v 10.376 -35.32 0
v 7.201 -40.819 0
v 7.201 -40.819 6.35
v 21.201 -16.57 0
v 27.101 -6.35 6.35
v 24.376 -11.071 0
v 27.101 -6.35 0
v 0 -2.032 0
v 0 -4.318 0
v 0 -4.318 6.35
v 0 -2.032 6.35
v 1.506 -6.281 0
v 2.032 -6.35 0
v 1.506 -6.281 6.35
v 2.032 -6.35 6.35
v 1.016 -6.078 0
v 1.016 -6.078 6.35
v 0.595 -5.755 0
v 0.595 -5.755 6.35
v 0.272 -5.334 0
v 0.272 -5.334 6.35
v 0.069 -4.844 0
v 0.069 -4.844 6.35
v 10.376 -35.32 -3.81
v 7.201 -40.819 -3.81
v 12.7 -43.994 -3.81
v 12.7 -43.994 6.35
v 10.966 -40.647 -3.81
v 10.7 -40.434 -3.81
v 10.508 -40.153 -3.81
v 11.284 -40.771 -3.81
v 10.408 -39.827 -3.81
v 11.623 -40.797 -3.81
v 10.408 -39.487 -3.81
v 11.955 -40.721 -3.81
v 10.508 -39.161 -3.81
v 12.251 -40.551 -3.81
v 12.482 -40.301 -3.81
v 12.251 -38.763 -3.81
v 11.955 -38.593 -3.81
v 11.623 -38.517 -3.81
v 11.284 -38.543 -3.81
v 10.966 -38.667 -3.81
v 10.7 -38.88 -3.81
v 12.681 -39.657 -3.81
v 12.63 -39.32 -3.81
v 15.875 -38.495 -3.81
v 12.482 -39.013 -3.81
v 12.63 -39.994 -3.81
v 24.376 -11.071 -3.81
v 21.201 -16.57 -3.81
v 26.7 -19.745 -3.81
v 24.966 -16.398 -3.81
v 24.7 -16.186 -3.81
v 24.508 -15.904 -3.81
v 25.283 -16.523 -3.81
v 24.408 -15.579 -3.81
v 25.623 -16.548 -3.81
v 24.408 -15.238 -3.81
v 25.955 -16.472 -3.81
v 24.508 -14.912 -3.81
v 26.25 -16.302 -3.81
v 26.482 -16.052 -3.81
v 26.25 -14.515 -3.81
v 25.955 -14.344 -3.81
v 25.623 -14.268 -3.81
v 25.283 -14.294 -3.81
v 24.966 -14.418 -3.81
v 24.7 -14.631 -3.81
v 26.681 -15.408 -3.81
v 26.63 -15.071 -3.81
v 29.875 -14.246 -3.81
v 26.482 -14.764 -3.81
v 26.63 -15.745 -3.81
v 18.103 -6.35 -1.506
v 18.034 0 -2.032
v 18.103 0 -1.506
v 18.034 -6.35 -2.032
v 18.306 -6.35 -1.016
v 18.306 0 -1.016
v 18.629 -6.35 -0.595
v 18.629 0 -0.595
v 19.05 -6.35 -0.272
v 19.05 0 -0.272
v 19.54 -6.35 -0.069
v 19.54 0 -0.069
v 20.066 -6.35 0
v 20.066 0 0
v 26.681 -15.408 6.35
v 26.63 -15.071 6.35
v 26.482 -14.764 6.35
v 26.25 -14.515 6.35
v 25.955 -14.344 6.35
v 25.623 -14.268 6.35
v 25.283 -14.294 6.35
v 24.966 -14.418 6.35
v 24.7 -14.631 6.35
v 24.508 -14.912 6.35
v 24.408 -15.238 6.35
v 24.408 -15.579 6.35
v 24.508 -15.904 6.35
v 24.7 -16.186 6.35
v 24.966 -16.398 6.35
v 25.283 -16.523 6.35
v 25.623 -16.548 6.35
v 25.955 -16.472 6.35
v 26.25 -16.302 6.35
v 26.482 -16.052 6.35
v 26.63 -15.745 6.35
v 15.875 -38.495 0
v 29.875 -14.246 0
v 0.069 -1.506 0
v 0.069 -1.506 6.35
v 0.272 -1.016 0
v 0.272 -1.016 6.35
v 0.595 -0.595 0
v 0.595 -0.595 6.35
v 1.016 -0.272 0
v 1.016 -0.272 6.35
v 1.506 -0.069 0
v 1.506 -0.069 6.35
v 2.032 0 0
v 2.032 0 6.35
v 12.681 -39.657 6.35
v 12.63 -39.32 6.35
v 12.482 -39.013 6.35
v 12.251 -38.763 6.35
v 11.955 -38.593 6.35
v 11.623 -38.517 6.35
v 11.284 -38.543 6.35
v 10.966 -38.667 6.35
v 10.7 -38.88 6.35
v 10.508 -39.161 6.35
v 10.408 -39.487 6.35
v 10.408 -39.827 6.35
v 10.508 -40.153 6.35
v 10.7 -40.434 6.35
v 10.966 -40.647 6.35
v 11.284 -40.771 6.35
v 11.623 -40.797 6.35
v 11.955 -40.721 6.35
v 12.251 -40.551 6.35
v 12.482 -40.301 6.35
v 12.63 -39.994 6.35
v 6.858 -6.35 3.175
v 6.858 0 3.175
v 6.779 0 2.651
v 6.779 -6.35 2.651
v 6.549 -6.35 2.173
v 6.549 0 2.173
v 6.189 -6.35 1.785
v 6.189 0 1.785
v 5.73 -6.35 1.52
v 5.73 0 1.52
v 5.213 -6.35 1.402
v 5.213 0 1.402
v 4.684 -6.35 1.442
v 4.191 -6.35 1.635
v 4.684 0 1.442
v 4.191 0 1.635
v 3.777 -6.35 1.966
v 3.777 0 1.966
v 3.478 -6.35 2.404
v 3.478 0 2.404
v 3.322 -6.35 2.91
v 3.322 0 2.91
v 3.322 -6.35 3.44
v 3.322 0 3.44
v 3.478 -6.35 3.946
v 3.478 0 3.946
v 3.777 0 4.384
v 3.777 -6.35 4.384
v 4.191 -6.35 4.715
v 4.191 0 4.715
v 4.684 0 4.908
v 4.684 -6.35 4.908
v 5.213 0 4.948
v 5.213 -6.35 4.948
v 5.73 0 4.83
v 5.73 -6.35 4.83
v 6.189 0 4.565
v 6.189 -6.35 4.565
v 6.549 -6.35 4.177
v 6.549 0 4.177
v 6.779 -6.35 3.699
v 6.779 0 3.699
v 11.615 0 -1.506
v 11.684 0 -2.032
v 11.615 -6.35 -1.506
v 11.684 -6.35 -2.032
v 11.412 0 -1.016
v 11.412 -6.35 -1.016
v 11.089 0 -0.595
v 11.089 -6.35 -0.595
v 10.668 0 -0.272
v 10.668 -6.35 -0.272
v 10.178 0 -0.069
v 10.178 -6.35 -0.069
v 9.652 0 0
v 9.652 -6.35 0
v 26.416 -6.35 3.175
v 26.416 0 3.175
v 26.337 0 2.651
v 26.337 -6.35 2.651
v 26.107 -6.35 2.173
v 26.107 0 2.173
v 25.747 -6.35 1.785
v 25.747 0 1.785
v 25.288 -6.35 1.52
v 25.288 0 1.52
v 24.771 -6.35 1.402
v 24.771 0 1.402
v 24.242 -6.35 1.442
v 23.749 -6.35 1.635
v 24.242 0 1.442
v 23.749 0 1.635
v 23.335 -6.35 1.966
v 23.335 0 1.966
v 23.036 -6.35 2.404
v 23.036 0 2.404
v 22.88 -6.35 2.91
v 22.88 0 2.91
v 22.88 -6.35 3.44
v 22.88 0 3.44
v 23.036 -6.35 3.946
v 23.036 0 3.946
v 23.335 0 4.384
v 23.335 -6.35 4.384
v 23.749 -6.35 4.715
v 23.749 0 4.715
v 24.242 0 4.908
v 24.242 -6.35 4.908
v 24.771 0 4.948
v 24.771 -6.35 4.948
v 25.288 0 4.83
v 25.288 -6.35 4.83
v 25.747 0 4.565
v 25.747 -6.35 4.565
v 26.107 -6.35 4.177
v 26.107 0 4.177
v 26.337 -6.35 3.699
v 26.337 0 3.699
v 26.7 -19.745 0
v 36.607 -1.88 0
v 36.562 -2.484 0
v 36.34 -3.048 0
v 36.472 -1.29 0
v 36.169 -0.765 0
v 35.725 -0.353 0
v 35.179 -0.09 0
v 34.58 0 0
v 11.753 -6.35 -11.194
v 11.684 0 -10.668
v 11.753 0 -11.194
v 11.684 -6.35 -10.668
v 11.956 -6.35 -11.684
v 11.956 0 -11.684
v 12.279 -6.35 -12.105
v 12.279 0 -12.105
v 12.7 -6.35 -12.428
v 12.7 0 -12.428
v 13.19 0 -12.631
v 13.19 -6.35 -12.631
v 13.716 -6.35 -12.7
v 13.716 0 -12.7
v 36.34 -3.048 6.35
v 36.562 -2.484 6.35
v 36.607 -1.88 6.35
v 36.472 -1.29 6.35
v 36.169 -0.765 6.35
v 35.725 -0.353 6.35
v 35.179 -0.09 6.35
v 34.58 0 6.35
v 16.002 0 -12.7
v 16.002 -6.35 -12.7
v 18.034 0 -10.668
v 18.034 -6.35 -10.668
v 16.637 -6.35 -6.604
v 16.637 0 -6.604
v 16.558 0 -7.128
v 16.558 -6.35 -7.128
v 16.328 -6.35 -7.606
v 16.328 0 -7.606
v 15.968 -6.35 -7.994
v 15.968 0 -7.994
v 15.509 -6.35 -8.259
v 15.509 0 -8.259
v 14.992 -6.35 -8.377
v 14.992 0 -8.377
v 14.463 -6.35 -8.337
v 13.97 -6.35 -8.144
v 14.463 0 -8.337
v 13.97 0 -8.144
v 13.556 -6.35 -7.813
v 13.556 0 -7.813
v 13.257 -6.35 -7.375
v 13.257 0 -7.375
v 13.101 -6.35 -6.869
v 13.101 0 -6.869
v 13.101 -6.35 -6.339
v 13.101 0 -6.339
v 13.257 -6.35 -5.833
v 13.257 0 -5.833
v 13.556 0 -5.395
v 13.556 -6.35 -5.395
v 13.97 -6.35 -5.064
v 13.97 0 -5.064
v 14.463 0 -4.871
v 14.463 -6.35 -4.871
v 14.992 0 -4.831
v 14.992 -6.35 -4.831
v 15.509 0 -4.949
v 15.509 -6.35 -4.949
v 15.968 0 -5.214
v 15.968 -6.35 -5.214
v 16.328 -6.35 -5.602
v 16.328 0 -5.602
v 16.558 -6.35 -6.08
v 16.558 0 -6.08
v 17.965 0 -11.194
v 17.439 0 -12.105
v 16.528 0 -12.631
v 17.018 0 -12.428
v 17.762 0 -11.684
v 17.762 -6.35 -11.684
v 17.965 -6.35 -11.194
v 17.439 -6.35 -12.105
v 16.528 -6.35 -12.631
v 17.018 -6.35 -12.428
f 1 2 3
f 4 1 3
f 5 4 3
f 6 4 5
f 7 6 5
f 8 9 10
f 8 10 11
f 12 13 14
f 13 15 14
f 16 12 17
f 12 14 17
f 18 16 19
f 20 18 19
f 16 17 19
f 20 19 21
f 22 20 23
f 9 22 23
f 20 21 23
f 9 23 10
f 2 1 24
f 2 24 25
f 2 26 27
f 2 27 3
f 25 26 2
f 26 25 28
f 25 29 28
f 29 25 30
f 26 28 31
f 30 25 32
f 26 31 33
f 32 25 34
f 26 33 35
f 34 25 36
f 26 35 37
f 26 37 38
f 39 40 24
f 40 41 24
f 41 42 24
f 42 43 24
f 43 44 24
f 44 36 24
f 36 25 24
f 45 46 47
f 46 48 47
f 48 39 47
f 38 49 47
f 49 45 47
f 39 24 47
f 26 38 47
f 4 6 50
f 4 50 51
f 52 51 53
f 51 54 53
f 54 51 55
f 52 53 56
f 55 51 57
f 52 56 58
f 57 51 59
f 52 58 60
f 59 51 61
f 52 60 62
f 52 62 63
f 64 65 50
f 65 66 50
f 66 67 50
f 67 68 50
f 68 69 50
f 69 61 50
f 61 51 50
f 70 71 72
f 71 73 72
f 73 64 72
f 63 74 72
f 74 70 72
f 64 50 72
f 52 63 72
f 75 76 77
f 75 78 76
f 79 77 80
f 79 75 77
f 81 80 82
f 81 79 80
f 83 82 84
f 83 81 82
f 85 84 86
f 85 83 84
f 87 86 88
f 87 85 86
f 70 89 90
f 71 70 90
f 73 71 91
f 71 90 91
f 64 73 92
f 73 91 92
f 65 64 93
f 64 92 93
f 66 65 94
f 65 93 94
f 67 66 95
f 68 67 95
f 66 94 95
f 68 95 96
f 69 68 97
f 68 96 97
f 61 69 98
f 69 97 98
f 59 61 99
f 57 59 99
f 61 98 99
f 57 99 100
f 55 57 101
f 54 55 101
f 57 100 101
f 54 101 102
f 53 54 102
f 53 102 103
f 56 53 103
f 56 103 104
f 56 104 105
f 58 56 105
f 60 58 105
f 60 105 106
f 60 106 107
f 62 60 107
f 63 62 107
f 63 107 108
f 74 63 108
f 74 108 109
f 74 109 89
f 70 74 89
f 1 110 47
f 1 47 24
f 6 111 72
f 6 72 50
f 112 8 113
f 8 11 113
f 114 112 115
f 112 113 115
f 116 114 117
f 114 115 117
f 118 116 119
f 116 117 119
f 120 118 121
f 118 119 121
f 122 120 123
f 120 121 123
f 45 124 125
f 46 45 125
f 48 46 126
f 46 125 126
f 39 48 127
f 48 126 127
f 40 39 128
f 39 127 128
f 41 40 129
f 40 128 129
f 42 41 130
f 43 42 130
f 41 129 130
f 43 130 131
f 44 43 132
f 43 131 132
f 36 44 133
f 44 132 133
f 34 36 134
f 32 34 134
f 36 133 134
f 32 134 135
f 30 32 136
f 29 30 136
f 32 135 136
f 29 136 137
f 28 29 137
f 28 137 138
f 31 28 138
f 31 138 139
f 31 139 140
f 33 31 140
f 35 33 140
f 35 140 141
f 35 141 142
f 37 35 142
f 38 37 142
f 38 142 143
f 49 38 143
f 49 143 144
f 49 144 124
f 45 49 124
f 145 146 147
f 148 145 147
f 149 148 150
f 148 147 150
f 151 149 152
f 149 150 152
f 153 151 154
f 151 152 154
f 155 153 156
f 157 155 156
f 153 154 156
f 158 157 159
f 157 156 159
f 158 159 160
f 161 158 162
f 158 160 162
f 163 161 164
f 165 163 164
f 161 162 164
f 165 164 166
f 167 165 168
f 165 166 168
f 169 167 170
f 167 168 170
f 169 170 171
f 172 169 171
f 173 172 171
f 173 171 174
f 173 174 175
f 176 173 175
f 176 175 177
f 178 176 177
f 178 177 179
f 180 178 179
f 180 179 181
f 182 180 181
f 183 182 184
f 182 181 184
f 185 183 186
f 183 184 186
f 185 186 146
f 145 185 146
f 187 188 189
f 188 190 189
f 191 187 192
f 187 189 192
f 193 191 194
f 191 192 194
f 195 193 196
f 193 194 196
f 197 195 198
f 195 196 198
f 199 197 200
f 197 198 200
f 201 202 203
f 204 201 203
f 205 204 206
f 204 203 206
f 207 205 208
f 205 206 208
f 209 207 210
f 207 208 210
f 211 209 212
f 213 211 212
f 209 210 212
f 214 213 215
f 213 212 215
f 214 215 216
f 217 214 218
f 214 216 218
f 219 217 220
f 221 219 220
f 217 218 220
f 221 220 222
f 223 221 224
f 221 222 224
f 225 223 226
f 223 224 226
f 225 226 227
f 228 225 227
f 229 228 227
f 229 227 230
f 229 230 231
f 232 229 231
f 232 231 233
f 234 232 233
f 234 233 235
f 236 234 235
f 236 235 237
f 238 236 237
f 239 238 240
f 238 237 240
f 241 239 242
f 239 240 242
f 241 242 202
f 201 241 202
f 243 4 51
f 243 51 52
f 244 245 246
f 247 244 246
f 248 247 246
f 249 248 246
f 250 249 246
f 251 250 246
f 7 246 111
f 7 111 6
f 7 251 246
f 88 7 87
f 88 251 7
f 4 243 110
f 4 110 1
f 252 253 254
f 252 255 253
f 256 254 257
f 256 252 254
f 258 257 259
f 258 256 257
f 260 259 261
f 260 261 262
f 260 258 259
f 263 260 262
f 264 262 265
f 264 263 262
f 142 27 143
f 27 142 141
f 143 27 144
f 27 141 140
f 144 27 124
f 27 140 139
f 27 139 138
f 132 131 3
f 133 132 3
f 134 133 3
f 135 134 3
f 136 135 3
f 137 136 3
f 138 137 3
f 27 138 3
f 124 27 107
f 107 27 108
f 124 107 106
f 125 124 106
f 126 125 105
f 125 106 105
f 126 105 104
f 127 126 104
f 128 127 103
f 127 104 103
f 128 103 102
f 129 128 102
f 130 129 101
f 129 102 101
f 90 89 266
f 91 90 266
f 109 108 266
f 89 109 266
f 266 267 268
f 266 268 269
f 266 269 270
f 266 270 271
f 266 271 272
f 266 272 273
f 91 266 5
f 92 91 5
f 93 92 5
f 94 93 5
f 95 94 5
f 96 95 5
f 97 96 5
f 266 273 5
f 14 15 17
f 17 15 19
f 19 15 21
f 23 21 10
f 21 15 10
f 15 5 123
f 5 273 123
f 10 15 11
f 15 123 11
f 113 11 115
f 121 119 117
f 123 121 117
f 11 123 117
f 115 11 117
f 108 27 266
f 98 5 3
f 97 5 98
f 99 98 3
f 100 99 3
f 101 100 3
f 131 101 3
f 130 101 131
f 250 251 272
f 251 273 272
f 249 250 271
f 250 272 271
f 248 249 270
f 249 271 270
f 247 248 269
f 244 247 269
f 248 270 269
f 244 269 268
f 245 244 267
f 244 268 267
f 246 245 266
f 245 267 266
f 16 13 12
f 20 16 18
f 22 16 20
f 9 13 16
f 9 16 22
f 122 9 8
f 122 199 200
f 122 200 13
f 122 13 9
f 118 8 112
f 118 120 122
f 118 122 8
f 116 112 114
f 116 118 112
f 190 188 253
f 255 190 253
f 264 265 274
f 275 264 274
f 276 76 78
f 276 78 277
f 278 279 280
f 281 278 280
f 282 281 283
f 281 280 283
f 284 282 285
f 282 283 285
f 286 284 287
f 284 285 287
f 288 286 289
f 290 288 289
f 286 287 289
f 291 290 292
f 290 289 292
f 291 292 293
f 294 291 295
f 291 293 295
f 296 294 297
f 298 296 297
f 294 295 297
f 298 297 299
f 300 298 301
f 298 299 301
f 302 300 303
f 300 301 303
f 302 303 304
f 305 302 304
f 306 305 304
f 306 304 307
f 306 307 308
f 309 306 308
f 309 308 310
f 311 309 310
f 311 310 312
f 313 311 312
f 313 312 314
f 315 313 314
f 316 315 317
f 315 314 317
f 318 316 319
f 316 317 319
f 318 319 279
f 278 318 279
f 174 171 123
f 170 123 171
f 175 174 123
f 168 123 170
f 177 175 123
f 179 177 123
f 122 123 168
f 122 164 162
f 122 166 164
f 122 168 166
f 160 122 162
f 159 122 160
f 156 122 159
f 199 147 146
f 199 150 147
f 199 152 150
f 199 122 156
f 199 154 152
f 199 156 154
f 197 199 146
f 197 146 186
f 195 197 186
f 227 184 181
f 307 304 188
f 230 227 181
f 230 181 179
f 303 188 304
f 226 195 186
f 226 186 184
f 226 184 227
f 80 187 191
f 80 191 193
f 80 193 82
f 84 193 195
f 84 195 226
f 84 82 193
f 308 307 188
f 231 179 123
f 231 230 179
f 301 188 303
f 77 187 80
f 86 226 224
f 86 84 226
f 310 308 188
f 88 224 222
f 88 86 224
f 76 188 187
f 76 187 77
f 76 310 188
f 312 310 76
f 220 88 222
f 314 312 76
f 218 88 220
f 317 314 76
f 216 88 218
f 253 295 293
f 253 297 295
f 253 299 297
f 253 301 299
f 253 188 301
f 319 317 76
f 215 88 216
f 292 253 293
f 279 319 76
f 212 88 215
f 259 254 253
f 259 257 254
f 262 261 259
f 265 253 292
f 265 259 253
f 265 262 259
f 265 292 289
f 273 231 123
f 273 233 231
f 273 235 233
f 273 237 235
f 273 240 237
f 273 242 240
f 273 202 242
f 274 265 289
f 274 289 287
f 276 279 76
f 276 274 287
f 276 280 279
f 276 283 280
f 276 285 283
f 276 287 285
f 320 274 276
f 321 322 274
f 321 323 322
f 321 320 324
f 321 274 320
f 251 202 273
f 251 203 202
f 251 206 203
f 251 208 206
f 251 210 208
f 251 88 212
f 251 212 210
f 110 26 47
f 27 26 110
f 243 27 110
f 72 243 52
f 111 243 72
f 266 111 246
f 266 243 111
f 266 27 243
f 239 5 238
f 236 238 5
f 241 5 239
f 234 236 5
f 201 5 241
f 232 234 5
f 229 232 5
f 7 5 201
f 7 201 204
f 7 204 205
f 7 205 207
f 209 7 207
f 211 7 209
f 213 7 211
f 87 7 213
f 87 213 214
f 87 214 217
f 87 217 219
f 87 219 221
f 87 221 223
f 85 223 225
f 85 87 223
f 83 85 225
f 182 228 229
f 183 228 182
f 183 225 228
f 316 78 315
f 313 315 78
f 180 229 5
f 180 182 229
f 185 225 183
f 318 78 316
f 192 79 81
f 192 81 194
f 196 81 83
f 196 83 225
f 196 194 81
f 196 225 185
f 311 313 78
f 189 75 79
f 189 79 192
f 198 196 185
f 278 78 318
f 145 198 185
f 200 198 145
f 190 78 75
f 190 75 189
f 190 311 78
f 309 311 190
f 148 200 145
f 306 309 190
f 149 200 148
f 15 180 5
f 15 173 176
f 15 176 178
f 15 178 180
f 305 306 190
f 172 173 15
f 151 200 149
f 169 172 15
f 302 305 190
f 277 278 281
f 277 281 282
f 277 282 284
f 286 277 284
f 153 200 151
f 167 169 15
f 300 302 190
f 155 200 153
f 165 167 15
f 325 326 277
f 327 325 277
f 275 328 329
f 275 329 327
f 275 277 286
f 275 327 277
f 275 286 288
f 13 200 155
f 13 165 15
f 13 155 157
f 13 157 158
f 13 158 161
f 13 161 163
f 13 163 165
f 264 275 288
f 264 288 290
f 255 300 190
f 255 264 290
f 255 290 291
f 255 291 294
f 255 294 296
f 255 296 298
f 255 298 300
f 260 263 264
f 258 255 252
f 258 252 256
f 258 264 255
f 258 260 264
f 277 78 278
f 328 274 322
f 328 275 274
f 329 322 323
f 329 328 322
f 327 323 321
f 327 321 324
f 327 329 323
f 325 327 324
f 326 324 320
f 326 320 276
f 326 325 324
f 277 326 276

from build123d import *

# Parameters (mm, degrees)
BOSS_EXTRUDE2_DEPTH = 6.35
SKETCH5_R           = 1.778
CUT_EXTRUDE1_DEPTH  = 6.35
SKETCH7_W           = 6.35
SKETCH7_H           = 12.7
BOSS_EXTRUDE3_DEPTH = 6.35
SKETCH8_R           = 1.778
CUT_EXTRUDE3_DEPTH  = 6.35
SKETCH9_R           = 1.143
CUT_EXTRUDE4_DEPTH  = 12.7
BOSS_EXTRUDE5_DEPTH = 3.81
FILLET1_R           = 2.032
SKETCH12_R          = 1.143
CUT_EXTRUDE5_DEPTH  = 12.7


with BuildPart() as part:
    # Sketch2 → Boss-Extrude2 (new body)
    with BuildSketch(Plane.XY):
        Polygon((0, 0), (38.1, 0), (12.7, -43.994090512), (7.200738686, -40.819090512), (27.101477372, -6.35), (0, -6.35), align=None)
    extrude(amount=BOSS_EXTRUDE2_DEPTH)

    # Sketch5 → Cut-Extrude1 (cut)
    with BuildSketch(Plane(origin=(0, 0, 0), x_dir=(1, 0, 0), z_dir=(0, 1, 0))):
        with Locations((5.08, -3.175)):
            Circle(SKETCH5_R)
        with Locations((24.638, -3.175)):
            Circle(SKETCH5_R)
    extrude(amount=-CUT_EXTRUDE1_DEPTH, mode=Mode.SUBTRACT)

    # Sketch7 → Boss-Extrude3 (add)
    with BuildSketch(Plane(origin=(0, 0, 0), x_dir=(1, 0, 0), z_dir=(0, 1, 0))):
        with Locations((14.859, 6.35)):
            Rectangle(SKETCH7_W, SKETCH7_H)
    extrude(amount=-BOSS_EXTRUDE3_DEPTH)

    # Sketch8 → Cut-Extrude3 (cut)
    with BuildSketch(Plane(origin=(0, 0, 0), x_dir=(1, 0, 0), z_dir=(0, 1, 0))):
        with Locations((14.859, 6.604)):
            Circle(SKETCH8_R)
    extrude(amount=-CUT_EXTRUDE3_DEPTH, mode=Mode.SUBTRACT)

    # Sketch9 → Cut-Extrude4 (cut)
    with BuildSketch(Plane.XY.offset(6.35)):
        with Locations((11.537869343, -39.656959855)):
            Circle(SKETCH9_R)
        with Locations((25.537841343, -15.408297047)):
            Circle(SKETCH9_R)
    extrude(amount=-CUT_EXTRUDE4_DEPTH, mode=Mode.SUBTRACT)

    # Sketch11 → Boss-Extrude5 (add)
    with BuildSketch(Plane(origin=(0, 0, 0), x_dir=(-1, 0, 0), z_dir=(0, 0, -1))):
        Polygon((-29.874972, -14.24616639), (-24.375710686, -11.07116639), (-21.200710686, -16.570427704), (-26.699972, -19.745427704), align=None)
        Polygon((-15.875, -38.494829198), (-10.375738686, -35.319829198), (-7.200738686, -40.819090512), (-12.7, -43.994090512), align=None)
    extrude(amount=BOSS_EXTRUDE5_DEPTH)

    # Fillet1
    fillet1_edges = [part.edges().sort_by_distance(p)[0] for p in [
        (0, 0, 3.175),
        (38.1, 0, 3.175),
        (0, -6.35, 3.175),
        (11.684, -3.175, 0),
        (11.684, -3.175, -12.7),
        (18.034, -3.175, -12.7),
        (18.034, -3.175, 0),
    ]]
    fillet(fillet1_edges, radius=FILLET1_R)

    # Sketch12 → Cut-Extrude5 (cut)
    with BuildSketch(Plane.XY.offset(6.35)):
        with Locations((25.537841343, -15.408297047)):
            Circle(SKETCH12_R)
        with Locations((11.537869343, -39.656959855)):
            Circle(SKETCH12_R)
    extrude(amount=-CUT_EXTRUDE5_DEPTH, mode=Mode.SUBTRACT)


solid = part.part
